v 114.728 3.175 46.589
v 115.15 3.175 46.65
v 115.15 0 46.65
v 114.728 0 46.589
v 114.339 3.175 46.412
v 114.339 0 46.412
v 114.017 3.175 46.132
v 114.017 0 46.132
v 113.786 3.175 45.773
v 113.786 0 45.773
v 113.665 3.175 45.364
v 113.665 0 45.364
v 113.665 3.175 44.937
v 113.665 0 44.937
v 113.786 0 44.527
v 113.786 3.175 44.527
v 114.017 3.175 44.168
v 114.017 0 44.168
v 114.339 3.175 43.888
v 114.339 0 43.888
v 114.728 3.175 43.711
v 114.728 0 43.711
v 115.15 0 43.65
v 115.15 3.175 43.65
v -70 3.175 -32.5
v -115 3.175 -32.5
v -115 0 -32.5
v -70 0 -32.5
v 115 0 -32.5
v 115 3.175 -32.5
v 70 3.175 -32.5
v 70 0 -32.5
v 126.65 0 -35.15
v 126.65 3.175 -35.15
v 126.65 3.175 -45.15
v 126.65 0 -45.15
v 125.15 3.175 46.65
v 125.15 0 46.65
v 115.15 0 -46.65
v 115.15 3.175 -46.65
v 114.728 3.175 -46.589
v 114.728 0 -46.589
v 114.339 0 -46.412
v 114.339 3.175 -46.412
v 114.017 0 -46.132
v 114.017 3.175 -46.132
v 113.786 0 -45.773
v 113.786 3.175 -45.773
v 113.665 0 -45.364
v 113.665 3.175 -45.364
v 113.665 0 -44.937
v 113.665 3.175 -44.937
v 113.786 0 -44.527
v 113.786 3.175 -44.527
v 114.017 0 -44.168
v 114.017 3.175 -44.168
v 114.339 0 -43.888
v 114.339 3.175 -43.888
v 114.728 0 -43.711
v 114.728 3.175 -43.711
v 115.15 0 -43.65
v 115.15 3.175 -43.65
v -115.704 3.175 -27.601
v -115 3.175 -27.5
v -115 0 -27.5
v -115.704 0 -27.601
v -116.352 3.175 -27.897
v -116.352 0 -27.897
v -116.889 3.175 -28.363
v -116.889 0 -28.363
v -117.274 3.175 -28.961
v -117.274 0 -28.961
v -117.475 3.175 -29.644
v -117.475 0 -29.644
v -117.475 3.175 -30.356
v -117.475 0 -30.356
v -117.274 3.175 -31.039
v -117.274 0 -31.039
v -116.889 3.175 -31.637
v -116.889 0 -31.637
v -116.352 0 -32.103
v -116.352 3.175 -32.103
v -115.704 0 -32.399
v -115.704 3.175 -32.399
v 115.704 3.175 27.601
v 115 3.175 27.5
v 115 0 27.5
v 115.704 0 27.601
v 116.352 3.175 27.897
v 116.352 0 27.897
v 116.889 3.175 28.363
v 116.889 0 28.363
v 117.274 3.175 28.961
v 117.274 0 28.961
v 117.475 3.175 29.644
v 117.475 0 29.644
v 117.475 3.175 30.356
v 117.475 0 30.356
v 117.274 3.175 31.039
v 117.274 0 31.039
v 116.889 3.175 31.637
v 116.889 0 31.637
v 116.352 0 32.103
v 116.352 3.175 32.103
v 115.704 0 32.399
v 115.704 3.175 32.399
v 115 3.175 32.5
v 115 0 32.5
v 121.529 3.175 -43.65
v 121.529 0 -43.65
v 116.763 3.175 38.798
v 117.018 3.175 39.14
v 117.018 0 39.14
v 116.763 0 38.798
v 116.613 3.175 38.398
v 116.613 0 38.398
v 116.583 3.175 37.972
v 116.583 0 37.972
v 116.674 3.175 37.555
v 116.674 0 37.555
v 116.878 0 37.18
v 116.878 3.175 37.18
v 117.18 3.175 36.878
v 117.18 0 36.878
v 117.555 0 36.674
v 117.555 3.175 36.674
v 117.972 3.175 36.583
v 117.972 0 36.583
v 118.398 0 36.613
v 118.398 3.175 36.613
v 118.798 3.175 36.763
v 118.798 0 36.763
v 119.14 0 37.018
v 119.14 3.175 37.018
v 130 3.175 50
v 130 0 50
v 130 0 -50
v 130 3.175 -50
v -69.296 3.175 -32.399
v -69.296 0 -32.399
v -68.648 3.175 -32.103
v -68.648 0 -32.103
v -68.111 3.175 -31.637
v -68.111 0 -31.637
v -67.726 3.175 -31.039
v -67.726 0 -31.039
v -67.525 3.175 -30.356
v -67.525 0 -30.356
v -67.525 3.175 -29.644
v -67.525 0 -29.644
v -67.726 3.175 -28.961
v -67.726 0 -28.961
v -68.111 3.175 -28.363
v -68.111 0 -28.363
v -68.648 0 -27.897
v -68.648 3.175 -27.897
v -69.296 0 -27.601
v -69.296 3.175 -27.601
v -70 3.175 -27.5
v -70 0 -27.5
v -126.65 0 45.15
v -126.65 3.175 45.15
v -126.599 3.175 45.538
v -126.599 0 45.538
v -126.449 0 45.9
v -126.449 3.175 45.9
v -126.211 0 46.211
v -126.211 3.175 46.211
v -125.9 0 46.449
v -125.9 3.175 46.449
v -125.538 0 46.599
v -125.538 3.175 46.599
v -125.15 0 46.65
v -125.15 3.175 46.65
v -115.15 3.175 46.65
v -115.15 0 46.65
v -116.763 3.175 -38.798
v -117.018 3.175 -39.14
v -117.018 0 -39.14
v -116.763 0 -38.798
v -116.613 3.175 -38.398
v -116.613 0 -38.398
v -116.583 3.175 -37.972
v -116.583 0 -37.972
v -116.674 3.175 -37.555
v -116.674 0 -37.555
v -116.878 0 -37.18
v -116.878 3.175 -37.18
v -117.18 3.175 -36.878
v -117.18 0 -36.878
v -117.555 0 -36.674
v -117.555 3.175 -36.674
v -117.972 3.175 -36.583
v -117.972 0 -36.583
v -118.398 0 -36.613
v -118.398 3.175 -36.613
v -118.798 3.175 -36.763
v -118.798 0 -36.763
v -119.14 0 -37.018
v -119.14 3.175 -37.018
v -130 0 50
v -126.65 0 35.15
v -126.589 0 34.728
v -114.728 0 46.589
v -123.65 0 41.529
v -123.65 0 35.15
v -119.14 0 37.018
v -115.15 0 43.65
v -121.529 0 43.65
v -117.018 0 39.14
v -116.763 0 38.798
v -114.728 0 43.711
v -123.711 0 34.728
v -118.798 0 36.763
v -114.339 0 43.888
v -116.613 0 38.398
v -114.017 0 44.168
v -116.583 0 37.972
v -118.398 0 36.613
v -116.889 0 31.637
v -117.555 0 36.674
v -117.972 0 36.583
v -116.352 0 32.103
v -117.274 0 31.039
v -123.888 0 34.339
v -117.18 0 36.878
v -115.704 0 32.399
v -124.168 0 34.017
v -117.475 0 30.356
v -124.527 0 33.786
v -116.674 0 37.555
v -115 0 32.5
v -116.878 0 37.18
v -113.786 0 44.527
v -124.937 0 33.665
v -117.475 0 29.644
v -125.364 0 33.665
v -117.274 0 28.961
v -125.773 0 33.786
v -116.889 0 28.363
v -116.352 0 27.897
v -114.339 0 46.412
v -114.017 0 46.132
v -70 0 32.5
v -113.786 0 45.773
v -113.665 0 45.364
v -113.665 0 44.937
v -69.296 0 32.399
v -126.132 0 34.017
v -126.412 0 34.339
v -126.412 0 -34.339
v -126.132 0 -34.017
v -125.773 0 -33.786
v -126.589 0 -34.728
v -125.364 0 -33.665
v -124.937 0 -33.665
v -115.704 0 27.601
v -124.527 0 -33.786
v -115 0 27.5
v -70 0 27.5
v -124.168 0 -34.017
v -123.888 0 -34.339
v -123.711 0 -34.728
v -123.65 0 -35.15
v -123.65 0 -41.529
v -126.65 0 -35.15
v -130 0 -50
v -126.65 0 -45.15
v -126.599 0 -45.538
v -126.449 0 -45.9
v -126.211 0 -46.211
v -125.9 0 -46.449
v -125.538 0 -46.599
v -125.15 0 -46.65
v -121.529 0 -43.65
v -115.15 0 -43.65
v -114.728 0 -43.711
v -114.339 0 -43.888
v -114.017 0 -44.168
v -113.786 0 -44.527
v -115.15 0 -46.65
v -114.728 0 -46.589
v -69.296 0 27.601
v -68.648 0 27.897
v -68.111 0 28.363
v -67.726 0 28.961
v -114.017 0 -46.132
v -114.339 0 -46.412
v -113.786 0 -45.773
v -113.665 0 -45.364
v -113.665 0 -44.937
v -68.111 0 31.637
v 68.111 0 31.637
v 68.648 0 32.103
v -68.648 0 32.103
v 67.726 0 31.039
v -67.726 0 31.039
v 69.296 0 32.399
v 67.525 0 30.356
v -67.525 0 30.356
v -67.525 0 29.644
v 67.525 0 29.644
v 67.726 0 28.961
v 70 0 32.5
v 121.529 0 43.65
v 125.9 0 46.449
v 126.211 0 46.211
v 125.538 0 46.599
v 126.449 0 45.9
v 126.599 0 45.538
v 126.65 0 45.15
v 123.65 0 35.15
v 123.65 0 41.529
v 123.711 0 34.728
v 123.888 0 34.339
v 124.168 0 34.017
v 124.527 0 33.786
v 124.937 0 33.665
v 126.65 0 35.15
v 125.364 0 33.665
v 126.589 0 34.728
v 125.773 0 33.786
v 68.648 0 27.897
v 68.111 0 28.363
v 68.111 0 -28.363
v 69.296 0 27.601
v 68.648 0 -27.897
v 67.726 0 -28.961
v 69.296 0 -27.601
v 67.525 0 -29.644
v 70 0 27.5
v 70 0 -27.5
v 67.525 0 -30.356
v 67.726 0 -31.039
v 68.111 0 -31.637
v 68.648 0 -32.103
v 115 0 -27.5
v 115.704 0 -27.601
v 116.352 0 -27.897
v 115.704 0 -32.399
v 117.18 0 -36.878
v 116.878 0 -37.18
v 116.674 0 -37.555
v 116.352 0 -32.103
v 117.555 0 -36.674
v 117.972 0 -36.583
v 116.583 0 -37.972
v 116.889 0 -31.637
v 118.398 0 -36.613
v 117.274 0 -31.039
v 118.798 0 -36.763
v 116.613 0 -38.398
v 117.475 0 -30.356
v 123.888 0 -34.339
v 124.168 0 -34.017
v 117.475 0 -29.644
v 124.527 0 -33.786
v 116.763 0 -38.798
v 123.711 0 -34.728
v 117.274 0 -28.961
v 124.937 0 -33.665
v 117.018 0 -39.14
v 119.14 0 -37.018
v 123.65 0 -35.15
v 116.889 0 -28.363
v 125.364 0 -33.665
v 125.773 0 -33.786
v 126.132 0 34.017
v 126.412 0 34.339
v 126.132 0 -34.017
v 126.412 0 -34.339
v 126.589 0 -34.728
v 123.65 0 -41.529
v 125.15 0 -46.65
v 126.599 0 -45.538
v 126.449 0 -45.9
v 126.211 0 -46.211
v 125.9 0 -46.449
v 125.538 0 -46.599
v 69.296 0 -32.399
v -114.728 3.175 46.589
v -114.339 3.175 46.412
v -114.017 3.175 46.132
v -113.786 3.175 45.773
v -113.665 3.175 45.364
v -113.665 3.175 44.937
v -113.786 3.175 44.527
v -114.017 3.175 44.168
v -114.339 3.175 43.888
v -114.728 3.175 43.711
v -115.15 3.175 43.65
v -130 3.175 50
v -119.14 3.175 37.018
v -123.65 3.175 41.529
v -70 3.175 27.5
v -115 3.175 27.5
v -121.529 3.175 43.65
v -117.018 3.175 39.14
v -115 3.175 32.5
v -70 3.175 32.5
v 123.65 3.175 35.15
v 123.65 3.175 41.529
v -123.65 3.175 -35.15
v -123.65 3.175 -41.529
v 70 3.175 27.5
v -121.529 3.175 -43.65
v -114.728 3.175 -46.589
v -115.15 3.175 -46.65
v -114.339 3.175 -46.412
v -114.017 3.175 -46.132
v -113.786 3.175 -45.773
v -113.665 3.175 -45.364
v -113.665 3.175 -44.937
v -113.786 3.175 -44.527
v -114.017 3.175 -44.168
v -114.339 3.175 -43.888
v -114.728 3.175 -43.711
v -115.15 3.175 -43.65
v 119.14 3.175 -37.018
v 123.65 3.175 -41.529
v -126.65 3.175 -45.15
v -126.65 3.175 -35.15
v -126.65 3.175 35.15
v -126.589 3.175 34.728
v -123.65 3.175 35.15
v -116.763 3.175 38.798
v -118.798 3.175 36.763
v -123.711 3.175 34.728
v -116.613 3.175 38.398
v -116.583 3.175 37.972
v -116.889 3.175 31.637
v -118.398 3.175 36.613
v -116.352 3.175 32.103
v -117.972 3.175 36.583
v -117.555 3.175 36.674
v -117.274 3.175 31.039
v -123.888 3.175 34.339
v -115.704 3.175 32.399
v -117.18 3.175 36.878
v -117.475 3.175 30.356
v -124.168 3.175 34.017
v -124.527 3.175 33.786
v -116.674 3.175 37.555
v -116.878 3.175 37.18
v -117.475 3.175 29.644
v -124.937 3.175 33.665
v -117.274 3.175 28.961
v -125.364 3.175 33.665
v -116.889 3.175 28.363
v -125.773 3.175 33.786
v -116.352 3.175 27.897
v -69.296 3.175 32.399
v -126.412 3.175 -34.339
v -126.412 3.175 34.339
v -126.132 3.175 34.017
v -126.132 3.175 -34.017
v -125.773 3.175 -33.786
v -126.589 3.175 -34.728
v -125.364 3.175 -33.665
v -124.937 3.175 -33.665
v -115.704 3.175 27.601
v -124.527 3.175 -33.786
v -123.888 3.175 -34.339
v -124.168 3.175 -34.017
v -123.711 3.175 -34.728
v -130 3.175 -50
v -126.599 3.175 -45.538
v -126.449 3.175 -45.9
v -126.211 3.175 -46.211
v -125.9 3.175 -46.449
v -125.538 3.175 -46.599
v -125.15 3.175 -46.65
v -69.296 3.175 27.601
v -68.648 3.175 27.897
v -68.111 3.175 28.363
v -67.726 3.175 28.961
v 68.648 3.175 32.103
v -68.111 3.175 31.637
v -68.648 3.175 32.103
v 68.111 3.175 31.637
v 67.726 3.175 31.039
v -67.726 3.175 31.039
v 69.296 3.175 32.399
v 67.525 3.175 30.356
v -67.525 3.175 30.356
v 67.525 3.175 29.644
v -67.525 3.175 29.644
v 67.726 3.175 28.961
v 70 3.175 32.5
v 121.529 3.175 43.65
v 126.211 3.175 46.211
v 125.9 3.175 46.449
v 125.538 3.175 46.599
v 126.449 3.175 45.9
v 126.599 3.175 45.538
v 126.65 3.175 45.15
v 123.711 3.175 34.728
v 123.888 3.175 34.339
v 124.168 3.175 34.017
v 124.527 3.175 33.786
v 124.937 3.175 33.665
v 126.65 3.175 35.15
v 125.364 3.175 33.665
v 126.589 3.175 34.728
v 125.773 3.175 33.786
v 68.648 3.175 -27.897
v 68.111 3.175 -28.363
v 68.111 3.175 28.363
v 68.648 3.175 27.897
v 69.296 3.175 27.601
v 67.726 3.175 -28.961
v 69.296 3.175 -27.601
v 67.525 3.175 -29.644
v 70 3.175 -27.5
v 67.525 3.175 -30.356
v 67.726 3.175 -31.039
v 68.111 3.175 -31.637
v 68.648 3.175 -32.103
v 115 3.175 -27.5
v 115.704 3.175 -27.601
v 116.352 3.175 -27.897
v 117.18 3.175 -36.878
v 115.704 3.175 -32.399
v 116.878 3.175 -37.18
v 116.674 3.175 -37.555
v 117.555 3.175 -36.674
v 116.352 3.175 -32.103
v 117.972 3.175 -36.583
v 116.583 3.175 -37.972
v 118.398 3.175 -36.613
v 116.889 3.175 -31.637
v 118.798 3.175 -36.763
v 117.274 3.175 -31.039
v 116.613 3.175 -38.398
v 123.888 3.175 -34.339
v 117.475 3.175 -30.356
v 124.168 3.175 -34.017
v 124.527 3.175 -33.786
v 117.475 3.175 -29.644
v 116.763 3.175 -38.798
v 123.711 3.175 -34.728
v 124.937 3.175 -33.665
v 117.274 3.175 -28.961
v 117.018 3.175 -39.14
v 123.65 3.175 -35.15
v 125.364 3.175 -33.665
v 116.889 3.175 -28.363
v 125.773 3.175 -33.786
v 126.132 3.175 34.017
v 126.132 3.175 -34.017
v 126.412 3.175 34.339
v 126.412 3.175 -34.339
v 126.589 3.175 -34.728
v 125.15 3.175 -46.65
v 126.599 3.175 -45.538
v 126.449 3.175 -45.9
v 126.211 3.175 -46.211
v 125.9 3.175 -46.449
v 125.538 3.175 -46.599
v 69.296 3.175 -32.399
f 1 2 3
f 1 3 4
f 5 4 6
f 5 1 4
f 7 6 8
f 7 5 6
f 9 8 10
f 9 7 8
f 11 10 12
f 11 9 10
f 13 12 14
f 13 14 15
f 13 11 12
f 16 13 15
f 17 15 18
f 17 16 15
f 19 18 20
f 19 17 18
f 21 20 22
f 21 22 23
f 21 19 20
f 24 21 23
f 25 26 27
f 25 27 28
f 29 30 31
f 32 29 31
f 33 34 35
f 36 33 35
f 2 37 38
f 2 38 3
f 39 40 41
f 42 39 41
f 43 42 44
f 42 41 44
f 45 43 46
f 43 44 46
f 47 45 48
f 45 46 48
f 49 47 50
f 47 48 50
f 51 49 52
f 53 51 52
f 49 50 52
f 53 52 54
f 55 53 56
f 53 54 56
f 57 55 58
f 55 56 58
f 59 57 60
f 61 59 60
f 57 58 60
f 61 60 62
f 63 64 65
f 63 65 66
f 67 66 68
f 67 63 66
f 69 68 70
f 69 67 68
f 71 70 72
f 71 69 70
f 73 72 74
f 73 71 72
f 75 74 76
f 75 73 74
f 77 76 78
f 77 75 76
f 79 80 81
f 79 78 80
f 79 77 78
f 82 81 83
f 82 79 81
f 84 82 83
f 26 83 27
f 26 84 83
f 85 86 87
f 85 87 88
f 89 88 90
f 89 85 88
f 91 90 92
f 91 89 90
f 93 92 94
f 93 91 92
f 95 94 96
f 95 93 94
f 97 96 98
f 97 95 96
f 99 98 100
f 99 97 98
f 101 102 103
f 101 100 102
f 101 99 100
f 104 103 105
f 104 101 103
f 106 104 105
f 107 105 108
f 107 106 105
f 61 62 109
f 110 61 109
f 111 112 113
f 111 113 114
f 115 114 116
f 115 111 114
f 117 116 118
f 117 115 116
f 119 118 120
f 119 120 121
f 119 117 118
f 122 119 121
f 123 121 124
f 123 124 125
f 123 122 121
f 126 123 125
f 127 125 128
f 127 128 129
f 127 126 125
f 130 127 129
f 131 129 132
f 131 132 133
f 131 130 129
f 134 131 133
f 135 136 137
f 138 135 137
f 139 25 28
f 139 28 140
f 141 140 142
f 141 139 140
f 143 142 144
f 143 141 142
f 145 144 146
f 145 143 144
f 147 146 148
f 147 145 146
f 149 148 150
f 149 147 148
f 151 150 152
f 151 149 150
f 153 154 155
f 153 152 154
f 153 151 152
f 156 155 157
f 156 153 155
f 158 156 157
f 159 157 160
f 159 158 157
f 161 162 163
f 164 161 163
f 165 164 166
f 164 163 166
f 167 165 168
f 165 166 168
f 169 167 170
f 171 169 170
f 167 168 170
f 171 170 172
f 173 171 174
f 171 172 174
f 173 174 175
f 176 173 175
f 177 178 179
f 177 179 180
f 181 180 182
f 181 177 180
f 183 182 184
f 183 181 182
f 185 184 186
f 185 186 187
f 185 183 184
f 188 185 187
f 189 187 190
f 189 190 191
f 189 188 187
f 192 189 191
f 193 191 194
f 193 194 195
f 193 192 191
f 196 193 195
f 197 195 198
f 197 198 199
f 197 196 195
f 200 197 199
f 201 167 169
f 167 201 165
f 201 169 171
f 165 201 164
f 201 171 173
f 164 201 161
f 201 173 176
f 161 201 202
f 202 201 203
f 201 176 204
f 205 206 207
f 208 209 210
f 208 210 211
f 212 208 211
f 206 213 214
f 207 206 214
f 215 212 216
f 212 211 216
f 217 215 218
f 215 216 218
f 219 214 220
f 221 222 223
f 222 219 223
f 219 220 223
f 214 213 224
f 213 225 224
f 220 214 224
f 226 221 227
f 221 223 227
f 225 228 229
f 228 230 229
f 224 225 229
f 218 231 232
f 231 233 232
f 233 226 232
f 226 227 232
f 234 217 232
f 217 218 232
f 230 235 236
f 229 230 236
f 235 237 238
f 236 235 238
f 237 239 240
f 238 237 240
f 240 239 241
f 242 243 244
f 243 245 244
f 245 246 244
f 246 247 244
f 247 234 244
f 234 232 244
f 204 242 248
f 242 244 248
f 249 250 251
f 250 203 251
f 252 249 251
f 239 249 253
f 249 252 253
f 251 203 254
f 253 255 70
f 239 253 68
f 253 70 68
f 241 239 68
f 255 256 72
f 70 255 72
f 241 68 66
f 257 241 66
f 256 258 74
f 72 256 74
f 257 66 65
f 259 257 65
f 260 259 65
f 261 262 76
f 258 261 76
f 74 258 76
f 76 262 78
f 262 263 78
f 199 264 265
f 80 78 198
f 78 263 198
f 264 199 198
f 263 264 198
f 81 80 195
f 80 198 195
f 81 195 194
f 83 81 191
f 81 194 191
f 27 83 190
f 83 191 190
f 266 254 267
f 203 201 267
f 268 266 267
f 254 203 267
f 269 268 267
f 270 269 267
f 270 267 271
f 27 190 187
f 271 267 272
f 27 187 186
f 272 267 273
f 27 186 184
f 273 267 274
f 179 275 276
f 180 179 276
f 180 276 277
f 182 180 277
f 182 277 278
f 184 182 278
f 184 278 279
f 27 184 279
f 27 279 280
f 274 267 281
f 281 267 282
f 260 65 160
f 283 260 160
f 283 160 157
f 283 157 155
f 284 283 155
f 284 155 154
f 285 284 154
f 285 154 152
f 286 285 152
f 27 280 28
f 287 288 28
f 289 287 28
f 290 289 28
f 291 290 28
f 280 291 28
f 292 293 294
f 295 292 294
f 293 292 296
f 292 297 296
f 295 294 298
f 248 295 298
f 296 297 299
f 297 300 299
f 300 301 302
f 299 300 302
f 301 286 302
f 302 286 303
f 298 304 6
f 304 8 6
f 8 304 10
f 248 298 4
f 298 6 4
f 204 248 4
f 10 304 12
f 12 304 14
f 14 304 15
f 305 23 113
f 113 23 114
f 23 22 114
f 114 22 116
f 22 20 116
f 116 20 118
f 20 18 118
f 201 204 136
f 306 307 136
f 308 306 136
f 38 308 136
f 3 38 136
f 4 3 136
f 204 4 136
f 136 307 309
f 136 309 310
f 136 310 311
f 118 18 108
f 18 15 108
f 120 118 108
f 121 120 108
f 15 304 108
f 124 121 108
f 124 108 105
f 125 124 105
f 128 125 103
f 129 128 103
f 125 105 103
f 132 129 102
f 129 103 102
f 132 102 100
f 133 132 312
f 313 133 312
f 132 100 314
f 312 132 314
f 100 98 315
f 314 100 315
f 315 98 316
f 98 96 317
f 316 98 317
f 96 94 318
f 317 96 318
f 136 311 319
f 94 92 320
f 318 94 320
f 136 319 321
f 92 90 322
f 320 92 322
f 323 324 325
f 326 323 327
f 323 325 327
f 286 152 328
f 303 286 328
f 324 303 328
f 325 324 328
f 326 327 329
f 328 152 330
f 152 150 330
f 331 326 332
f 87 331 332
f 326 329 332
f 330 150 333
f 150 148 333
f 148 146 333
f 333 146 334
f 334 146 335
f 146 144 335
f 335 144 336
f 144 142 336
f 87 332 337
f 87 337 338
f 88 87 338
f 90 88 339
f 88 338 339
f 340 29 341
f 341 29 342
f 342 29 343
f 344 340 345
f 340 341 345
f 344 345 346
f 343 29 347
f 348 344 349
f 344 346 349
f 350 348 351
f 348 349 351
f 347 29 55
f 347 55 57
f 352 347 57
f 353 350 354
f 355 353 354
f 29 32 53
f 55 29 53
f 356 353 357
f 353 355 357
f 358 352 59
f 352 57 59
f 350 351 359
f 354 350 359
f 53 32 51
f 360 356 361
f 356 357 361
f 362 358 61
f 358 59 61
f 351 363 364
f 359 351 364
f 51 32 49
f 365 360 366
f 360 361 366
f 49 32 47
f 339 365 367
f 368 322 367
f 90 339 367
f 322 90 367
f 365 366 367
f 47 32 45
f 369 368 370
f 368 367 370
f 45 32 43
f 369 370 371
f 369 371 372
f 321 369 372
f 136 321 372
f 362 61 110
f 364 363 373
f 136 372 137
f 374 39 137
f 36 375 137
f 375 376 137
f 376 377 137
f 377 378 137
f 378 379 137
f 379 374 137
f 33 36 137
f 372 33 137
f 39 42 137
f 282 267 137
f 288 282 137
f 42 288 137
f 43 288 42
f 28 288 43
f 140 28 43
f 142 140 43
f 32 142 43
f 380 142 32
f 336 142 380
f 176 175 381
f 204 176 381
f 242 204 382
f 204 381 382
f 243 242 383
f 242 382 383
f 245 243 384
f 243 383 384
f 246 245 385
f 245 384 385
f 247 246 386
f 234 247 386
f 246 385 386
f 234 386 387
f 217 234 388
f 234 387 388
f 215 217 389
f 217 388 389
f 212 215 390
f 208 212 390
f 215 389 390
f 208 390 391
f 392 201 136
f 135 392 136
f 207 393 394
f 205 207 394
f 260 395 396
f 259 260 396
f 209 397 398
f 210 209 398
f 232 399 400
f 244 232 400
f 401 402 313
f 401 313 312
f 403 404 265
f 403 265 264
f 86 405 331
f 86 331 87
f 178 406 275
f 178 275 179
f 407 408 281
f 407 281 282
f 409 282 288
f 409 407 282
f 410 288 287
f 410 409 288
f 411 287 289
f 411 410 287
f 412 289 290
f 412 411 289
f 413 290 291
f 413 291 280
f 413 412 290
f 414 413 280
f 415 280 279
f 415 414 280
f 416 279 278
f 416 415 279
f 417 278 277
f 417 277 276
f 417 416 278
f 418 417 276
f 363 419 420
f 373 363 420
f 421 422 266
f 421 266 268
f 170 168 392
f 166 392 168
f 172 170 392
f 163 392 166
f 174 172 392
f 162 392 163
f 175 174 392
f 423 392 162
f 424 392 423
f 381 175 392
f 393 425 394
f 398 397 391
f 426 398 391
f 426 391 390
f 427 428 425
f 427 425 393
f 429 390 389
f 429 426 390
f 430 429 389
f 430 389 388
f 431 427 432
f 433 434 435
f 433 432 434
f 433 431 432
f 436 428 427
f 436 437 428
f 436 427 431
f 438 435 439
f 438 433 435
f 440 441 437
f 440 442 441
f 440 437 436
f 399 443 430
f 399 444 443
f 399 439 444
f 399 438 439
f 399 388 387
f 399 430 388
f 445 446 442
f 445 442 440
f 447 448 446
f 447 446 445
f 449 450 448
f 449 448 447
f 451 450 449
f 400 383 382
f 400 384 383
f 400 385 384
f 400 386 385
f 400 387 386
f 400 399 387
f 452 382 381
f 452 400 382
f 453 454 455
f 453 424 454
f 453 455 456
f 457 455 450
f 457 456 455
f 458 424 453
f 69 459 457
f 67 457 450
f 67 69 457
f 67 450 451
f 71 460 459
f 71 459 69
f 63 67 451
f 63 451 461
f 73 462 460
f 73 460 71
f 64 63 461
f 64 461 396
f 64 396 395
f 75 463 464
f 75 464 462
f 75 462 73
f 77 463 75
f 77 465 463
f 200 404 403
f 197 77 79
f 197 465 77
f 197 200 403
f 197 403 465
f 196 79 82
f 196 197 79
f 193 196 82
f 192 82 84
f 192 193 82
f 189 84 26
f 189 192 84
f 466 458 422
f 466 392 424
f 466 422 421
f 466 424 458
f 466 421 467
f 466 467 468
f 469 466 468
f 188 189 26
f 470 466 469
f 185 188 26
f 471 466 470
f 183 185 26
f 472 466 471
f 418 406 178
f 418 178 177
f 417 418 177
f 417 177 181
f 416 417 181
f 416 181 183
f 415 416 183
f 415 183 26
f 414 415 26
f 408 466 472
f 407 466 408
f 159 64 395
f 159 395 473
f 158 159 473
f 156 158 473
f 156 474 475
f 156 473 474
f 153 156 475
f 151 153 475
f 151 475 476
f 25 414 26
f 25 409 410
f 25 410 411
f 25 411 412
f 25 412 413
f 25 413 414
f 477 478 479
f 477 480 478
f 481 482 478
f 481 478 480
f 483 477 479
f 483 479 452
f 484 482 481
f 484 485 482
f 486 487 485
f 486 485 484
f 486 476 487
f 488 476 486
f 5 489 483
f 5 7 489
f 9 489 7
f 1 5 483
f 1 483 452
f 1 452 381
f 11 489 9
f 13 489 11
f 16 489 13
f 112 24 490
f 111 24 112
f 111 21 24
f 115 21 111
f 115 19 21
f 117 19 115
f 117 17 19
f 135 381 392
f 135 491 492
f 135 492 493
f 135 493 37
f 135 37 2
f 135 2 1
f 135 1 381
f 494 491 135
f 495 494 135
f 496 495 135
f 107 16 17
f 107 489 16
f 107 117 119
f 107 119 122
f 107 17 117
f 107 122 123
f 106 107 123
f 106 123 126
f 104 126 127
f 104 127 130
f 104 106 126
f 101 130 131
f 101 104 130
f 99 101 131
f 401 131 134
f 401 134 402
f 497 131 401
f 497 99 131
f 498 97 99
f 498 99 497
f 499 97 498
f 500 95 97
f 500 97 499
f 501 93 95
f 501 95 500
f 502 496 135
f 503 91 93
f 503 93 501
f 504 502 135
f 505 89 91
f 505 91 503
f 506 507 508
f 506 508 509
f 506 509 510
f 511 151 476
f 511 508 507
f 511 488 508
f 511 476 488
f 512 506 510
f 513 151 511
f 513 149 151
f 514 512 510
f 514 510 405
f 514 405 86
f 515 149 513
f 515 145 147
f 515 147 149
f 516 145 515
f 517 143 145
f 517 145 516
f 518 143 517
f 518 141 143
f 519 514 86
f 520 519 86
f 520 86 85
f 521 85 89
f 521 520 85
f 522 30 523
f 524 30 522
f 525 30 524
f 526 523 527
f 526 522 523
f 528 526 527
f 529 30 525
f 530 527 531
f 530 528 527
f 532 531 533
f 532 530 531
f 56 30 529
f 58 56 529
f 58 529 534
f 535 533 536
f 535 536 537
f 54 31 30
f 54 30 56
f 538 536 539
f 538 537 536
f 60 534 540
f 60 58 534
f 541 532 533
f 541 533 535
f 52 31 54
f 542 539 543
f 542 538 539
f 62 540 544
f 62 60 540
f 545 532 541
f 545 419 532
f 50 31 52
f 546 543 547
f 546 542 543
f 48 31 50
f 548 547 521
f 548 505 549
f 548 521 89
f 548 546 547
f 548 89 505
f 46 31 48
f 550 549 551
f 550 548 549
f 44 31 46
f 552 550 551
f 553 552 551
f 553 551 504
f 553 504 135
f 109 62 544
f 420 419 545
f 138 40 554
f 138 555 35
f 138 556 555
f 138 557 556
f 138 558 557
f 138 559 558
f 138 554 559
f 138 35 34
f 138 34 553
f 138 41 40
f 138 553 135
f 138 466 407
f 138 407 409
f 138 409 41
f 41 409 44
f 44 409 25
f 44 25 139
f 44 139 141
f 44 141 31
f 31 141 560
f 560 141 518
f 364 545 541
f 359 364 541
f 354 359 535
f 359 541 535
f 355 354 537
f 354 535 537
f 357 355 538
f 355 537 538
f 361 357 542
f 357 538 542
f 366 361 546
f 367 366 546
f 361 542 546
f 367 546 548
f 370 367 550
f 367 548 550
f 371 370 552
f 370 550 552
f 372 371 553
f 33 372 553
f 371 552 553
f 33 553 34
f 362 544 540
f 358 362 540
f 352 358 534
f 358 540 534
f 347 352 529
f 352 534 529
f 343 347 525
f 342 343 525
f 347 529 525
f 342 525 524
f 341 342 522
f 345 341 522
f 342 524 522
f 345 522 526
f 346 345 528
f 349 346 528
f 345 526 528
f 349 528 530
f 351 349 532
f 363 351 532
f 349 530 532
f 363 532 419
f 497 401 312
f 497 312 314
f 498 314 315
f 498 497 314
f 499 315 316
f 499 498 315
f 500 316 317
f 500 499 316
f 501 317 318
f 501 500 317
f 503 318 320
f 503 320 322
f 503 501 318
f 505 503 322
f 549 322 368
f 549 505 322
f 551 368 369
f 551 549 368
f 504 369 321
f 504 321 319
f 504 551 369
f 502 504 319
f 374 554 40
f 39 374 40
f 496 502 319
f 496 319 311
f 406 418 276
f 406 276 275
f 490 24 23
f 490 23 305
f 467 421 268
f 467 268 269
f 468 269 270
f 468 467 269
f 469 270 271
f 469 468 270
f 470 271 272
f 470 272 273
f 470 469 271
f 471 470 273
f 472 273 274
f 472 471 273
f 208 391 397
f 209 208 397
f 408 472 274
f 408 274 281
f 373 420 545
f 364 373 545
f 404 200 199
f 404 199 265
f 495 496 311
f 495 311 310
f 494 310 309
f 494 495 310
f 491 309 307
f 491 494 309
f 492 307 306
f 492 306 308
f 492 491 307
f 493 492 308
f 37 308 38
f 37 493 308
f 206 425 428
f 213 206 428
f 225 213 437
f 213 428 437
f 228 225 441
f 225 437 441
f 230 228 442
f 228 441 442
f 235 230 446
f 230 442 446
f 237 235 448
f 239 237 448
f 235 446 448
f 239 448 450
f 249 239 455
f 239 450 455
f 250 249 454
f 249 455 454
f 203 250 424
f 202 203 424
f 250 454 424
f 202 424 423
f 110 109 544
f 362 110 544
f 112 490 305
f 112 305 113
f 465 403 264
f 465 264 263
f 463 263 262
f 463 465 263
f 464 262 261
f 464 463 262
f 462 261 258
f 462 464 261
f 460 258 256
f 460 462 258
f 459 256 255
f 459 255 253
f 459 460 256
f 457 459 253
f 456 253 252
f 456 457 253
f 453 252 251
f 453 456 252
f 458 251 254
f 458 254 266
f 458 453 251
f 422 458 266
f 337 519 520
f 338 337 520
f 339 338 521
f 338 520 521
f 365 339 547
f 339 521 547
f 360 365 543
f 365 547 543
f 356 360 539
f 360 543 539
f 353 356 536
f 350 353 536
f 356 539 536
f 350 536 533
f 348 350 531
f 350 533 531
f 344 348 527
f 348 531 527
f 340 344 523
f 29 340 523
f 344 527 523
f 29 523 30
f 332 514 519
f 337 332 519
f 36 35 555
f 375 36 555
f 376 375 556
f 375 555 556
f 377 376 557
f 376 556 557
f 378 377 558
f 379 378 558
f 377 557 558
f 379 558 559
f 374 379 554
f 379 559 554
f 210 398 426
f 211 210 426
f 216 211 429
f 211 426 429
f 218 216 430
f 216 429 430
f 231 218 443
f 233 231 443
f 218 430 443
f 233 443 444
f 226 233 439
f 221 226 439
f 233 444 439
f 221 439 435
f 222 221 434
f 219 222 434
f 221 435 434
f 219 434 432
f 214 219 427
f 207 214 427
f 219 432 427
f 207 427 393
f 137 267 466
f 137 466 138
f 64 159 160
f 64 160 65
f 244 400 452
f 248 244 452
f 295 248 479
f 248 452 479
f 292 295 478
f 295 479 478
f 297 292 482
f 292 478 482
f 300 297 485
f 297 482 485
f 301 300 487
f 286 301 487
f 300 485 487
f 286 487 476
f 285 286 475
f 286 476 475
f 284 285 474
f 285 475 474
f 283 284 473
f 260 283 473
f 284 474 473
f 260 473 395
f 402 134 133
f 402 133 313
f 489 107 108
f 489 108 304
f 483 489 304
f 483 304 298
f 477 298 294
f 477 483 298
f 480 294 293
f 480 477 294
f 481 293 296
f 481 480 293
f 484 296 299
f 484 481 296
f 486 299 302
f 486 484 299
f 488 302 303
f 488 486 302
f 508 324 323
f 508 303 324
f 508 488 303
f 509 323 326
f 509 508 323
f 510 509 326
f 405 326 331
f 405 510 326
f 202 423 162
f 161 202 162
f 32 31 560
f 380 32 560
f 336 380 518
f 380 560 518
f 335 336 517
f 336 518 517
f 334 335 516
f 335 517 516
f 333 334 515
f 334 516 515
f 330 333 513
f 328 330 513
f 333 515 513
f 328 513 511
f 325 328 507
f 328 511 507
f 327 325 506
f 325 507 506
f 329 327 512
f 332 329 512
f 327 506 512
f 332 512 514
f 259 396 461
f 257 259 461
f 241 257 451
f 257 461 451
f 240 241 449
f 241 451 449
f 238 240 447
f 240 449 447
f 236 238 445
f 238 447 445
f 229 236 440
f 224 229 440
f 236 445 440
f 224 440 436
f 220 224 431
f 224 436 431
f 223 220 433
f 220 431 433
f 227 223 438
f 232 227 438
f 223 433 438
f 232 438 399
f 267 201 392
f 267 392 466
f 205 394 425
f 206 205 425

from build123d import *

# Parameters (mm, degrees)
SKETCH1_W            = 260
SKETCH1_H            = 100
BASE_DEPTH           = 3.175
SLOTS_DEPTH          = 140.320065407
MOUNT_HOLES_DEPTH    = 3.175
MIRROR2_COPY_1_DEPTH = 3.175


with BuildPart() as part:
    # Sketch1 → Base (new body)
    with BuildSketch(Plane(origin=(0, 0, 0), x_dir=(1, 0, 0), z_dir=(0, 1, 0))):
        Rectangle(SKETCH1_W, SKETCH1_H)
    extrude(amount=BASE_DEPTH)

    # Sketch2 → Slots (cut, through all)
    with BuildSketch(Plane(origin=(0, 3.175, 0), x_dir=(1, 0, 0), z_dir=(0, 1, 0))):
        with BuildLine():
            Line((-115, 32.5), (-70, 32.5))
            ThreePointArc((-70, 32.5), (-67.5, 30), (-70, 27.5))
            Line((-70, 27.5), (-115, 27.5))
            ThreePointArc((-115, 27.5), (-117.5, 30), (-115, 32.5))
        make_face()
        with BuildLine():
            Line((-115, -32.5), (-70, -32.5))
            ThreePointArc((-70, -32.5), (-67.5, -30), (-70, -27.5))
            Line((-70, -27.5), (-115, -27.5))
            ThreePointArc((-115, -27.5), (-117.5, -30), (-115, -32.5))
        make_face()
        with BuildLine():
            Line((115, 32.5), (70, 32.5))
            ThreePointArc((70, 32.5), (67.5, 30), (70, 27.5))
            Line((70, 27.5), (115, 27.5))
            ThreePointArc((115, 27.5), (117.5, 30), (115, 32.5))
        make_face()
        with BuildLine():
            Line((115, -32.5), (70, -32.5))
            ThreePointArc((70, -32.5), (67.5, -30), (70, -27.5))
            Line((70, -27.5), (115, -27.5))
            ThreePointArc((115, -27.5), (117.5, -30), (115, -32.5))
        make_face()
    extrude(amount=-SLOTS_DEPTH, mode=Mode.SUBTRACT)

    # Sketch3 → Mount Holes (cut)
    with BuildSketch(Plane(origin=(0, 3.175, 0), x_dir=(1, 0, 0), z_dir=(0, 1, 0))):
        with BuildLine():
            Line((-125.150208204, 46.650208204), (-115.150208204, 46.650208204))
            ThreePointArc((-115.150208204, 46.650208204), (-113.650208204, 45.150208204), (-115.150208204, 43.650208204))
            Line((-115.150208204, 43.650208204), (-121.528887861, 43.650208204))
            Line((-121.528887861, 43.650208204), (-117.018480221, 39.139800564))
            ThreePointArc((-117.018480221, 39.139800564), (-117.018480221, 37.018480221), (-119.139800564, 37.018480221))
            Line((-119.139800564, 37.018480221), (-123.650208204, 41.528887861))
            Line((-123.650208204, 41.528887861), (-123.650208204, 35.150208204))
            ThreePointArc((-123.650208204, 35.150208204), (-125.150208204, 33.650208204), (-126.650208204, 35.150208204))
            Line((-126.650208204, 35.150208204), (-126.650208204, 45.150208204))
            ThreePointArc((-126.650208204, 45.150208204), (-126.210868376, 46.210868376), (-125.150208204, 46.650208204))
        make_face()
    mount_holes = extrude(amount=-MOUNT_HOLES_DEPTH, mode=Mode.SUBTRACT)

    # Mirror1: Mount Holes across plane
    add(mount_holes.mirror(Plane(origin=(0, 0, 0), x_dir=(0, 0, 1), z_dir=(1, 0, 0))), mode=Mode.SUBTRACT)

    # Mirror2: Mount Holes across plane
    add(mount_holes.mirror(Plane.XY), mode=Mode.SUBTRACT)

    # Mirror2 copy 1 sketch → Mirror2 copy 1 (cut)
    with BuildSketch(Plane(origin=(0, 3.175, 0), x_dir=(-1, 0, 0), z_dir=(0, 1, 0))):
        with BuildLine():
            Line((-125.150208204, 46.650208204), (-115.150208204, 46.650208204))
            ThreePointArc((-115.150208204, 46.650208204), (-113.650208204, 45.150208204), (-115.150208204, 43.650208204))
            Line((-115.150208204, 43.650208204), (-121.528887861, 43.650208204))
            Line((-121.528887861, 43.650208204), (-117.018480221, 39.139800564))
            ThreePointArc((-117.018480221, 39.139800564), (-117.018480221, 37.018480221), (-119.139800564, 37.018480221))
            Line((-119.139800564, 37.018480221), (-123.650208204, 41.528887861))
            Line((-123.650208204, 41.528887861), (-123.650208204, 35.150208204))
            ThreePointArc((-123.650208204, 35.150208204), (-125.150208204, 33.650208204), (-126.650208204, 35.150208204))
            Line((-126.650208204, 35.150208204), (-126.650208204, 45.150208204))
            ThreePointArc((-126.650208204, 45.150208204), (-126.210868376, 46.210868376), (-125.150208204, 46.650208204))
        make_face()
    extrude(amount=-MIRROR2_COPY_1_DEPTH, mode=Mode.SUBTRACT)


solid = part.part
